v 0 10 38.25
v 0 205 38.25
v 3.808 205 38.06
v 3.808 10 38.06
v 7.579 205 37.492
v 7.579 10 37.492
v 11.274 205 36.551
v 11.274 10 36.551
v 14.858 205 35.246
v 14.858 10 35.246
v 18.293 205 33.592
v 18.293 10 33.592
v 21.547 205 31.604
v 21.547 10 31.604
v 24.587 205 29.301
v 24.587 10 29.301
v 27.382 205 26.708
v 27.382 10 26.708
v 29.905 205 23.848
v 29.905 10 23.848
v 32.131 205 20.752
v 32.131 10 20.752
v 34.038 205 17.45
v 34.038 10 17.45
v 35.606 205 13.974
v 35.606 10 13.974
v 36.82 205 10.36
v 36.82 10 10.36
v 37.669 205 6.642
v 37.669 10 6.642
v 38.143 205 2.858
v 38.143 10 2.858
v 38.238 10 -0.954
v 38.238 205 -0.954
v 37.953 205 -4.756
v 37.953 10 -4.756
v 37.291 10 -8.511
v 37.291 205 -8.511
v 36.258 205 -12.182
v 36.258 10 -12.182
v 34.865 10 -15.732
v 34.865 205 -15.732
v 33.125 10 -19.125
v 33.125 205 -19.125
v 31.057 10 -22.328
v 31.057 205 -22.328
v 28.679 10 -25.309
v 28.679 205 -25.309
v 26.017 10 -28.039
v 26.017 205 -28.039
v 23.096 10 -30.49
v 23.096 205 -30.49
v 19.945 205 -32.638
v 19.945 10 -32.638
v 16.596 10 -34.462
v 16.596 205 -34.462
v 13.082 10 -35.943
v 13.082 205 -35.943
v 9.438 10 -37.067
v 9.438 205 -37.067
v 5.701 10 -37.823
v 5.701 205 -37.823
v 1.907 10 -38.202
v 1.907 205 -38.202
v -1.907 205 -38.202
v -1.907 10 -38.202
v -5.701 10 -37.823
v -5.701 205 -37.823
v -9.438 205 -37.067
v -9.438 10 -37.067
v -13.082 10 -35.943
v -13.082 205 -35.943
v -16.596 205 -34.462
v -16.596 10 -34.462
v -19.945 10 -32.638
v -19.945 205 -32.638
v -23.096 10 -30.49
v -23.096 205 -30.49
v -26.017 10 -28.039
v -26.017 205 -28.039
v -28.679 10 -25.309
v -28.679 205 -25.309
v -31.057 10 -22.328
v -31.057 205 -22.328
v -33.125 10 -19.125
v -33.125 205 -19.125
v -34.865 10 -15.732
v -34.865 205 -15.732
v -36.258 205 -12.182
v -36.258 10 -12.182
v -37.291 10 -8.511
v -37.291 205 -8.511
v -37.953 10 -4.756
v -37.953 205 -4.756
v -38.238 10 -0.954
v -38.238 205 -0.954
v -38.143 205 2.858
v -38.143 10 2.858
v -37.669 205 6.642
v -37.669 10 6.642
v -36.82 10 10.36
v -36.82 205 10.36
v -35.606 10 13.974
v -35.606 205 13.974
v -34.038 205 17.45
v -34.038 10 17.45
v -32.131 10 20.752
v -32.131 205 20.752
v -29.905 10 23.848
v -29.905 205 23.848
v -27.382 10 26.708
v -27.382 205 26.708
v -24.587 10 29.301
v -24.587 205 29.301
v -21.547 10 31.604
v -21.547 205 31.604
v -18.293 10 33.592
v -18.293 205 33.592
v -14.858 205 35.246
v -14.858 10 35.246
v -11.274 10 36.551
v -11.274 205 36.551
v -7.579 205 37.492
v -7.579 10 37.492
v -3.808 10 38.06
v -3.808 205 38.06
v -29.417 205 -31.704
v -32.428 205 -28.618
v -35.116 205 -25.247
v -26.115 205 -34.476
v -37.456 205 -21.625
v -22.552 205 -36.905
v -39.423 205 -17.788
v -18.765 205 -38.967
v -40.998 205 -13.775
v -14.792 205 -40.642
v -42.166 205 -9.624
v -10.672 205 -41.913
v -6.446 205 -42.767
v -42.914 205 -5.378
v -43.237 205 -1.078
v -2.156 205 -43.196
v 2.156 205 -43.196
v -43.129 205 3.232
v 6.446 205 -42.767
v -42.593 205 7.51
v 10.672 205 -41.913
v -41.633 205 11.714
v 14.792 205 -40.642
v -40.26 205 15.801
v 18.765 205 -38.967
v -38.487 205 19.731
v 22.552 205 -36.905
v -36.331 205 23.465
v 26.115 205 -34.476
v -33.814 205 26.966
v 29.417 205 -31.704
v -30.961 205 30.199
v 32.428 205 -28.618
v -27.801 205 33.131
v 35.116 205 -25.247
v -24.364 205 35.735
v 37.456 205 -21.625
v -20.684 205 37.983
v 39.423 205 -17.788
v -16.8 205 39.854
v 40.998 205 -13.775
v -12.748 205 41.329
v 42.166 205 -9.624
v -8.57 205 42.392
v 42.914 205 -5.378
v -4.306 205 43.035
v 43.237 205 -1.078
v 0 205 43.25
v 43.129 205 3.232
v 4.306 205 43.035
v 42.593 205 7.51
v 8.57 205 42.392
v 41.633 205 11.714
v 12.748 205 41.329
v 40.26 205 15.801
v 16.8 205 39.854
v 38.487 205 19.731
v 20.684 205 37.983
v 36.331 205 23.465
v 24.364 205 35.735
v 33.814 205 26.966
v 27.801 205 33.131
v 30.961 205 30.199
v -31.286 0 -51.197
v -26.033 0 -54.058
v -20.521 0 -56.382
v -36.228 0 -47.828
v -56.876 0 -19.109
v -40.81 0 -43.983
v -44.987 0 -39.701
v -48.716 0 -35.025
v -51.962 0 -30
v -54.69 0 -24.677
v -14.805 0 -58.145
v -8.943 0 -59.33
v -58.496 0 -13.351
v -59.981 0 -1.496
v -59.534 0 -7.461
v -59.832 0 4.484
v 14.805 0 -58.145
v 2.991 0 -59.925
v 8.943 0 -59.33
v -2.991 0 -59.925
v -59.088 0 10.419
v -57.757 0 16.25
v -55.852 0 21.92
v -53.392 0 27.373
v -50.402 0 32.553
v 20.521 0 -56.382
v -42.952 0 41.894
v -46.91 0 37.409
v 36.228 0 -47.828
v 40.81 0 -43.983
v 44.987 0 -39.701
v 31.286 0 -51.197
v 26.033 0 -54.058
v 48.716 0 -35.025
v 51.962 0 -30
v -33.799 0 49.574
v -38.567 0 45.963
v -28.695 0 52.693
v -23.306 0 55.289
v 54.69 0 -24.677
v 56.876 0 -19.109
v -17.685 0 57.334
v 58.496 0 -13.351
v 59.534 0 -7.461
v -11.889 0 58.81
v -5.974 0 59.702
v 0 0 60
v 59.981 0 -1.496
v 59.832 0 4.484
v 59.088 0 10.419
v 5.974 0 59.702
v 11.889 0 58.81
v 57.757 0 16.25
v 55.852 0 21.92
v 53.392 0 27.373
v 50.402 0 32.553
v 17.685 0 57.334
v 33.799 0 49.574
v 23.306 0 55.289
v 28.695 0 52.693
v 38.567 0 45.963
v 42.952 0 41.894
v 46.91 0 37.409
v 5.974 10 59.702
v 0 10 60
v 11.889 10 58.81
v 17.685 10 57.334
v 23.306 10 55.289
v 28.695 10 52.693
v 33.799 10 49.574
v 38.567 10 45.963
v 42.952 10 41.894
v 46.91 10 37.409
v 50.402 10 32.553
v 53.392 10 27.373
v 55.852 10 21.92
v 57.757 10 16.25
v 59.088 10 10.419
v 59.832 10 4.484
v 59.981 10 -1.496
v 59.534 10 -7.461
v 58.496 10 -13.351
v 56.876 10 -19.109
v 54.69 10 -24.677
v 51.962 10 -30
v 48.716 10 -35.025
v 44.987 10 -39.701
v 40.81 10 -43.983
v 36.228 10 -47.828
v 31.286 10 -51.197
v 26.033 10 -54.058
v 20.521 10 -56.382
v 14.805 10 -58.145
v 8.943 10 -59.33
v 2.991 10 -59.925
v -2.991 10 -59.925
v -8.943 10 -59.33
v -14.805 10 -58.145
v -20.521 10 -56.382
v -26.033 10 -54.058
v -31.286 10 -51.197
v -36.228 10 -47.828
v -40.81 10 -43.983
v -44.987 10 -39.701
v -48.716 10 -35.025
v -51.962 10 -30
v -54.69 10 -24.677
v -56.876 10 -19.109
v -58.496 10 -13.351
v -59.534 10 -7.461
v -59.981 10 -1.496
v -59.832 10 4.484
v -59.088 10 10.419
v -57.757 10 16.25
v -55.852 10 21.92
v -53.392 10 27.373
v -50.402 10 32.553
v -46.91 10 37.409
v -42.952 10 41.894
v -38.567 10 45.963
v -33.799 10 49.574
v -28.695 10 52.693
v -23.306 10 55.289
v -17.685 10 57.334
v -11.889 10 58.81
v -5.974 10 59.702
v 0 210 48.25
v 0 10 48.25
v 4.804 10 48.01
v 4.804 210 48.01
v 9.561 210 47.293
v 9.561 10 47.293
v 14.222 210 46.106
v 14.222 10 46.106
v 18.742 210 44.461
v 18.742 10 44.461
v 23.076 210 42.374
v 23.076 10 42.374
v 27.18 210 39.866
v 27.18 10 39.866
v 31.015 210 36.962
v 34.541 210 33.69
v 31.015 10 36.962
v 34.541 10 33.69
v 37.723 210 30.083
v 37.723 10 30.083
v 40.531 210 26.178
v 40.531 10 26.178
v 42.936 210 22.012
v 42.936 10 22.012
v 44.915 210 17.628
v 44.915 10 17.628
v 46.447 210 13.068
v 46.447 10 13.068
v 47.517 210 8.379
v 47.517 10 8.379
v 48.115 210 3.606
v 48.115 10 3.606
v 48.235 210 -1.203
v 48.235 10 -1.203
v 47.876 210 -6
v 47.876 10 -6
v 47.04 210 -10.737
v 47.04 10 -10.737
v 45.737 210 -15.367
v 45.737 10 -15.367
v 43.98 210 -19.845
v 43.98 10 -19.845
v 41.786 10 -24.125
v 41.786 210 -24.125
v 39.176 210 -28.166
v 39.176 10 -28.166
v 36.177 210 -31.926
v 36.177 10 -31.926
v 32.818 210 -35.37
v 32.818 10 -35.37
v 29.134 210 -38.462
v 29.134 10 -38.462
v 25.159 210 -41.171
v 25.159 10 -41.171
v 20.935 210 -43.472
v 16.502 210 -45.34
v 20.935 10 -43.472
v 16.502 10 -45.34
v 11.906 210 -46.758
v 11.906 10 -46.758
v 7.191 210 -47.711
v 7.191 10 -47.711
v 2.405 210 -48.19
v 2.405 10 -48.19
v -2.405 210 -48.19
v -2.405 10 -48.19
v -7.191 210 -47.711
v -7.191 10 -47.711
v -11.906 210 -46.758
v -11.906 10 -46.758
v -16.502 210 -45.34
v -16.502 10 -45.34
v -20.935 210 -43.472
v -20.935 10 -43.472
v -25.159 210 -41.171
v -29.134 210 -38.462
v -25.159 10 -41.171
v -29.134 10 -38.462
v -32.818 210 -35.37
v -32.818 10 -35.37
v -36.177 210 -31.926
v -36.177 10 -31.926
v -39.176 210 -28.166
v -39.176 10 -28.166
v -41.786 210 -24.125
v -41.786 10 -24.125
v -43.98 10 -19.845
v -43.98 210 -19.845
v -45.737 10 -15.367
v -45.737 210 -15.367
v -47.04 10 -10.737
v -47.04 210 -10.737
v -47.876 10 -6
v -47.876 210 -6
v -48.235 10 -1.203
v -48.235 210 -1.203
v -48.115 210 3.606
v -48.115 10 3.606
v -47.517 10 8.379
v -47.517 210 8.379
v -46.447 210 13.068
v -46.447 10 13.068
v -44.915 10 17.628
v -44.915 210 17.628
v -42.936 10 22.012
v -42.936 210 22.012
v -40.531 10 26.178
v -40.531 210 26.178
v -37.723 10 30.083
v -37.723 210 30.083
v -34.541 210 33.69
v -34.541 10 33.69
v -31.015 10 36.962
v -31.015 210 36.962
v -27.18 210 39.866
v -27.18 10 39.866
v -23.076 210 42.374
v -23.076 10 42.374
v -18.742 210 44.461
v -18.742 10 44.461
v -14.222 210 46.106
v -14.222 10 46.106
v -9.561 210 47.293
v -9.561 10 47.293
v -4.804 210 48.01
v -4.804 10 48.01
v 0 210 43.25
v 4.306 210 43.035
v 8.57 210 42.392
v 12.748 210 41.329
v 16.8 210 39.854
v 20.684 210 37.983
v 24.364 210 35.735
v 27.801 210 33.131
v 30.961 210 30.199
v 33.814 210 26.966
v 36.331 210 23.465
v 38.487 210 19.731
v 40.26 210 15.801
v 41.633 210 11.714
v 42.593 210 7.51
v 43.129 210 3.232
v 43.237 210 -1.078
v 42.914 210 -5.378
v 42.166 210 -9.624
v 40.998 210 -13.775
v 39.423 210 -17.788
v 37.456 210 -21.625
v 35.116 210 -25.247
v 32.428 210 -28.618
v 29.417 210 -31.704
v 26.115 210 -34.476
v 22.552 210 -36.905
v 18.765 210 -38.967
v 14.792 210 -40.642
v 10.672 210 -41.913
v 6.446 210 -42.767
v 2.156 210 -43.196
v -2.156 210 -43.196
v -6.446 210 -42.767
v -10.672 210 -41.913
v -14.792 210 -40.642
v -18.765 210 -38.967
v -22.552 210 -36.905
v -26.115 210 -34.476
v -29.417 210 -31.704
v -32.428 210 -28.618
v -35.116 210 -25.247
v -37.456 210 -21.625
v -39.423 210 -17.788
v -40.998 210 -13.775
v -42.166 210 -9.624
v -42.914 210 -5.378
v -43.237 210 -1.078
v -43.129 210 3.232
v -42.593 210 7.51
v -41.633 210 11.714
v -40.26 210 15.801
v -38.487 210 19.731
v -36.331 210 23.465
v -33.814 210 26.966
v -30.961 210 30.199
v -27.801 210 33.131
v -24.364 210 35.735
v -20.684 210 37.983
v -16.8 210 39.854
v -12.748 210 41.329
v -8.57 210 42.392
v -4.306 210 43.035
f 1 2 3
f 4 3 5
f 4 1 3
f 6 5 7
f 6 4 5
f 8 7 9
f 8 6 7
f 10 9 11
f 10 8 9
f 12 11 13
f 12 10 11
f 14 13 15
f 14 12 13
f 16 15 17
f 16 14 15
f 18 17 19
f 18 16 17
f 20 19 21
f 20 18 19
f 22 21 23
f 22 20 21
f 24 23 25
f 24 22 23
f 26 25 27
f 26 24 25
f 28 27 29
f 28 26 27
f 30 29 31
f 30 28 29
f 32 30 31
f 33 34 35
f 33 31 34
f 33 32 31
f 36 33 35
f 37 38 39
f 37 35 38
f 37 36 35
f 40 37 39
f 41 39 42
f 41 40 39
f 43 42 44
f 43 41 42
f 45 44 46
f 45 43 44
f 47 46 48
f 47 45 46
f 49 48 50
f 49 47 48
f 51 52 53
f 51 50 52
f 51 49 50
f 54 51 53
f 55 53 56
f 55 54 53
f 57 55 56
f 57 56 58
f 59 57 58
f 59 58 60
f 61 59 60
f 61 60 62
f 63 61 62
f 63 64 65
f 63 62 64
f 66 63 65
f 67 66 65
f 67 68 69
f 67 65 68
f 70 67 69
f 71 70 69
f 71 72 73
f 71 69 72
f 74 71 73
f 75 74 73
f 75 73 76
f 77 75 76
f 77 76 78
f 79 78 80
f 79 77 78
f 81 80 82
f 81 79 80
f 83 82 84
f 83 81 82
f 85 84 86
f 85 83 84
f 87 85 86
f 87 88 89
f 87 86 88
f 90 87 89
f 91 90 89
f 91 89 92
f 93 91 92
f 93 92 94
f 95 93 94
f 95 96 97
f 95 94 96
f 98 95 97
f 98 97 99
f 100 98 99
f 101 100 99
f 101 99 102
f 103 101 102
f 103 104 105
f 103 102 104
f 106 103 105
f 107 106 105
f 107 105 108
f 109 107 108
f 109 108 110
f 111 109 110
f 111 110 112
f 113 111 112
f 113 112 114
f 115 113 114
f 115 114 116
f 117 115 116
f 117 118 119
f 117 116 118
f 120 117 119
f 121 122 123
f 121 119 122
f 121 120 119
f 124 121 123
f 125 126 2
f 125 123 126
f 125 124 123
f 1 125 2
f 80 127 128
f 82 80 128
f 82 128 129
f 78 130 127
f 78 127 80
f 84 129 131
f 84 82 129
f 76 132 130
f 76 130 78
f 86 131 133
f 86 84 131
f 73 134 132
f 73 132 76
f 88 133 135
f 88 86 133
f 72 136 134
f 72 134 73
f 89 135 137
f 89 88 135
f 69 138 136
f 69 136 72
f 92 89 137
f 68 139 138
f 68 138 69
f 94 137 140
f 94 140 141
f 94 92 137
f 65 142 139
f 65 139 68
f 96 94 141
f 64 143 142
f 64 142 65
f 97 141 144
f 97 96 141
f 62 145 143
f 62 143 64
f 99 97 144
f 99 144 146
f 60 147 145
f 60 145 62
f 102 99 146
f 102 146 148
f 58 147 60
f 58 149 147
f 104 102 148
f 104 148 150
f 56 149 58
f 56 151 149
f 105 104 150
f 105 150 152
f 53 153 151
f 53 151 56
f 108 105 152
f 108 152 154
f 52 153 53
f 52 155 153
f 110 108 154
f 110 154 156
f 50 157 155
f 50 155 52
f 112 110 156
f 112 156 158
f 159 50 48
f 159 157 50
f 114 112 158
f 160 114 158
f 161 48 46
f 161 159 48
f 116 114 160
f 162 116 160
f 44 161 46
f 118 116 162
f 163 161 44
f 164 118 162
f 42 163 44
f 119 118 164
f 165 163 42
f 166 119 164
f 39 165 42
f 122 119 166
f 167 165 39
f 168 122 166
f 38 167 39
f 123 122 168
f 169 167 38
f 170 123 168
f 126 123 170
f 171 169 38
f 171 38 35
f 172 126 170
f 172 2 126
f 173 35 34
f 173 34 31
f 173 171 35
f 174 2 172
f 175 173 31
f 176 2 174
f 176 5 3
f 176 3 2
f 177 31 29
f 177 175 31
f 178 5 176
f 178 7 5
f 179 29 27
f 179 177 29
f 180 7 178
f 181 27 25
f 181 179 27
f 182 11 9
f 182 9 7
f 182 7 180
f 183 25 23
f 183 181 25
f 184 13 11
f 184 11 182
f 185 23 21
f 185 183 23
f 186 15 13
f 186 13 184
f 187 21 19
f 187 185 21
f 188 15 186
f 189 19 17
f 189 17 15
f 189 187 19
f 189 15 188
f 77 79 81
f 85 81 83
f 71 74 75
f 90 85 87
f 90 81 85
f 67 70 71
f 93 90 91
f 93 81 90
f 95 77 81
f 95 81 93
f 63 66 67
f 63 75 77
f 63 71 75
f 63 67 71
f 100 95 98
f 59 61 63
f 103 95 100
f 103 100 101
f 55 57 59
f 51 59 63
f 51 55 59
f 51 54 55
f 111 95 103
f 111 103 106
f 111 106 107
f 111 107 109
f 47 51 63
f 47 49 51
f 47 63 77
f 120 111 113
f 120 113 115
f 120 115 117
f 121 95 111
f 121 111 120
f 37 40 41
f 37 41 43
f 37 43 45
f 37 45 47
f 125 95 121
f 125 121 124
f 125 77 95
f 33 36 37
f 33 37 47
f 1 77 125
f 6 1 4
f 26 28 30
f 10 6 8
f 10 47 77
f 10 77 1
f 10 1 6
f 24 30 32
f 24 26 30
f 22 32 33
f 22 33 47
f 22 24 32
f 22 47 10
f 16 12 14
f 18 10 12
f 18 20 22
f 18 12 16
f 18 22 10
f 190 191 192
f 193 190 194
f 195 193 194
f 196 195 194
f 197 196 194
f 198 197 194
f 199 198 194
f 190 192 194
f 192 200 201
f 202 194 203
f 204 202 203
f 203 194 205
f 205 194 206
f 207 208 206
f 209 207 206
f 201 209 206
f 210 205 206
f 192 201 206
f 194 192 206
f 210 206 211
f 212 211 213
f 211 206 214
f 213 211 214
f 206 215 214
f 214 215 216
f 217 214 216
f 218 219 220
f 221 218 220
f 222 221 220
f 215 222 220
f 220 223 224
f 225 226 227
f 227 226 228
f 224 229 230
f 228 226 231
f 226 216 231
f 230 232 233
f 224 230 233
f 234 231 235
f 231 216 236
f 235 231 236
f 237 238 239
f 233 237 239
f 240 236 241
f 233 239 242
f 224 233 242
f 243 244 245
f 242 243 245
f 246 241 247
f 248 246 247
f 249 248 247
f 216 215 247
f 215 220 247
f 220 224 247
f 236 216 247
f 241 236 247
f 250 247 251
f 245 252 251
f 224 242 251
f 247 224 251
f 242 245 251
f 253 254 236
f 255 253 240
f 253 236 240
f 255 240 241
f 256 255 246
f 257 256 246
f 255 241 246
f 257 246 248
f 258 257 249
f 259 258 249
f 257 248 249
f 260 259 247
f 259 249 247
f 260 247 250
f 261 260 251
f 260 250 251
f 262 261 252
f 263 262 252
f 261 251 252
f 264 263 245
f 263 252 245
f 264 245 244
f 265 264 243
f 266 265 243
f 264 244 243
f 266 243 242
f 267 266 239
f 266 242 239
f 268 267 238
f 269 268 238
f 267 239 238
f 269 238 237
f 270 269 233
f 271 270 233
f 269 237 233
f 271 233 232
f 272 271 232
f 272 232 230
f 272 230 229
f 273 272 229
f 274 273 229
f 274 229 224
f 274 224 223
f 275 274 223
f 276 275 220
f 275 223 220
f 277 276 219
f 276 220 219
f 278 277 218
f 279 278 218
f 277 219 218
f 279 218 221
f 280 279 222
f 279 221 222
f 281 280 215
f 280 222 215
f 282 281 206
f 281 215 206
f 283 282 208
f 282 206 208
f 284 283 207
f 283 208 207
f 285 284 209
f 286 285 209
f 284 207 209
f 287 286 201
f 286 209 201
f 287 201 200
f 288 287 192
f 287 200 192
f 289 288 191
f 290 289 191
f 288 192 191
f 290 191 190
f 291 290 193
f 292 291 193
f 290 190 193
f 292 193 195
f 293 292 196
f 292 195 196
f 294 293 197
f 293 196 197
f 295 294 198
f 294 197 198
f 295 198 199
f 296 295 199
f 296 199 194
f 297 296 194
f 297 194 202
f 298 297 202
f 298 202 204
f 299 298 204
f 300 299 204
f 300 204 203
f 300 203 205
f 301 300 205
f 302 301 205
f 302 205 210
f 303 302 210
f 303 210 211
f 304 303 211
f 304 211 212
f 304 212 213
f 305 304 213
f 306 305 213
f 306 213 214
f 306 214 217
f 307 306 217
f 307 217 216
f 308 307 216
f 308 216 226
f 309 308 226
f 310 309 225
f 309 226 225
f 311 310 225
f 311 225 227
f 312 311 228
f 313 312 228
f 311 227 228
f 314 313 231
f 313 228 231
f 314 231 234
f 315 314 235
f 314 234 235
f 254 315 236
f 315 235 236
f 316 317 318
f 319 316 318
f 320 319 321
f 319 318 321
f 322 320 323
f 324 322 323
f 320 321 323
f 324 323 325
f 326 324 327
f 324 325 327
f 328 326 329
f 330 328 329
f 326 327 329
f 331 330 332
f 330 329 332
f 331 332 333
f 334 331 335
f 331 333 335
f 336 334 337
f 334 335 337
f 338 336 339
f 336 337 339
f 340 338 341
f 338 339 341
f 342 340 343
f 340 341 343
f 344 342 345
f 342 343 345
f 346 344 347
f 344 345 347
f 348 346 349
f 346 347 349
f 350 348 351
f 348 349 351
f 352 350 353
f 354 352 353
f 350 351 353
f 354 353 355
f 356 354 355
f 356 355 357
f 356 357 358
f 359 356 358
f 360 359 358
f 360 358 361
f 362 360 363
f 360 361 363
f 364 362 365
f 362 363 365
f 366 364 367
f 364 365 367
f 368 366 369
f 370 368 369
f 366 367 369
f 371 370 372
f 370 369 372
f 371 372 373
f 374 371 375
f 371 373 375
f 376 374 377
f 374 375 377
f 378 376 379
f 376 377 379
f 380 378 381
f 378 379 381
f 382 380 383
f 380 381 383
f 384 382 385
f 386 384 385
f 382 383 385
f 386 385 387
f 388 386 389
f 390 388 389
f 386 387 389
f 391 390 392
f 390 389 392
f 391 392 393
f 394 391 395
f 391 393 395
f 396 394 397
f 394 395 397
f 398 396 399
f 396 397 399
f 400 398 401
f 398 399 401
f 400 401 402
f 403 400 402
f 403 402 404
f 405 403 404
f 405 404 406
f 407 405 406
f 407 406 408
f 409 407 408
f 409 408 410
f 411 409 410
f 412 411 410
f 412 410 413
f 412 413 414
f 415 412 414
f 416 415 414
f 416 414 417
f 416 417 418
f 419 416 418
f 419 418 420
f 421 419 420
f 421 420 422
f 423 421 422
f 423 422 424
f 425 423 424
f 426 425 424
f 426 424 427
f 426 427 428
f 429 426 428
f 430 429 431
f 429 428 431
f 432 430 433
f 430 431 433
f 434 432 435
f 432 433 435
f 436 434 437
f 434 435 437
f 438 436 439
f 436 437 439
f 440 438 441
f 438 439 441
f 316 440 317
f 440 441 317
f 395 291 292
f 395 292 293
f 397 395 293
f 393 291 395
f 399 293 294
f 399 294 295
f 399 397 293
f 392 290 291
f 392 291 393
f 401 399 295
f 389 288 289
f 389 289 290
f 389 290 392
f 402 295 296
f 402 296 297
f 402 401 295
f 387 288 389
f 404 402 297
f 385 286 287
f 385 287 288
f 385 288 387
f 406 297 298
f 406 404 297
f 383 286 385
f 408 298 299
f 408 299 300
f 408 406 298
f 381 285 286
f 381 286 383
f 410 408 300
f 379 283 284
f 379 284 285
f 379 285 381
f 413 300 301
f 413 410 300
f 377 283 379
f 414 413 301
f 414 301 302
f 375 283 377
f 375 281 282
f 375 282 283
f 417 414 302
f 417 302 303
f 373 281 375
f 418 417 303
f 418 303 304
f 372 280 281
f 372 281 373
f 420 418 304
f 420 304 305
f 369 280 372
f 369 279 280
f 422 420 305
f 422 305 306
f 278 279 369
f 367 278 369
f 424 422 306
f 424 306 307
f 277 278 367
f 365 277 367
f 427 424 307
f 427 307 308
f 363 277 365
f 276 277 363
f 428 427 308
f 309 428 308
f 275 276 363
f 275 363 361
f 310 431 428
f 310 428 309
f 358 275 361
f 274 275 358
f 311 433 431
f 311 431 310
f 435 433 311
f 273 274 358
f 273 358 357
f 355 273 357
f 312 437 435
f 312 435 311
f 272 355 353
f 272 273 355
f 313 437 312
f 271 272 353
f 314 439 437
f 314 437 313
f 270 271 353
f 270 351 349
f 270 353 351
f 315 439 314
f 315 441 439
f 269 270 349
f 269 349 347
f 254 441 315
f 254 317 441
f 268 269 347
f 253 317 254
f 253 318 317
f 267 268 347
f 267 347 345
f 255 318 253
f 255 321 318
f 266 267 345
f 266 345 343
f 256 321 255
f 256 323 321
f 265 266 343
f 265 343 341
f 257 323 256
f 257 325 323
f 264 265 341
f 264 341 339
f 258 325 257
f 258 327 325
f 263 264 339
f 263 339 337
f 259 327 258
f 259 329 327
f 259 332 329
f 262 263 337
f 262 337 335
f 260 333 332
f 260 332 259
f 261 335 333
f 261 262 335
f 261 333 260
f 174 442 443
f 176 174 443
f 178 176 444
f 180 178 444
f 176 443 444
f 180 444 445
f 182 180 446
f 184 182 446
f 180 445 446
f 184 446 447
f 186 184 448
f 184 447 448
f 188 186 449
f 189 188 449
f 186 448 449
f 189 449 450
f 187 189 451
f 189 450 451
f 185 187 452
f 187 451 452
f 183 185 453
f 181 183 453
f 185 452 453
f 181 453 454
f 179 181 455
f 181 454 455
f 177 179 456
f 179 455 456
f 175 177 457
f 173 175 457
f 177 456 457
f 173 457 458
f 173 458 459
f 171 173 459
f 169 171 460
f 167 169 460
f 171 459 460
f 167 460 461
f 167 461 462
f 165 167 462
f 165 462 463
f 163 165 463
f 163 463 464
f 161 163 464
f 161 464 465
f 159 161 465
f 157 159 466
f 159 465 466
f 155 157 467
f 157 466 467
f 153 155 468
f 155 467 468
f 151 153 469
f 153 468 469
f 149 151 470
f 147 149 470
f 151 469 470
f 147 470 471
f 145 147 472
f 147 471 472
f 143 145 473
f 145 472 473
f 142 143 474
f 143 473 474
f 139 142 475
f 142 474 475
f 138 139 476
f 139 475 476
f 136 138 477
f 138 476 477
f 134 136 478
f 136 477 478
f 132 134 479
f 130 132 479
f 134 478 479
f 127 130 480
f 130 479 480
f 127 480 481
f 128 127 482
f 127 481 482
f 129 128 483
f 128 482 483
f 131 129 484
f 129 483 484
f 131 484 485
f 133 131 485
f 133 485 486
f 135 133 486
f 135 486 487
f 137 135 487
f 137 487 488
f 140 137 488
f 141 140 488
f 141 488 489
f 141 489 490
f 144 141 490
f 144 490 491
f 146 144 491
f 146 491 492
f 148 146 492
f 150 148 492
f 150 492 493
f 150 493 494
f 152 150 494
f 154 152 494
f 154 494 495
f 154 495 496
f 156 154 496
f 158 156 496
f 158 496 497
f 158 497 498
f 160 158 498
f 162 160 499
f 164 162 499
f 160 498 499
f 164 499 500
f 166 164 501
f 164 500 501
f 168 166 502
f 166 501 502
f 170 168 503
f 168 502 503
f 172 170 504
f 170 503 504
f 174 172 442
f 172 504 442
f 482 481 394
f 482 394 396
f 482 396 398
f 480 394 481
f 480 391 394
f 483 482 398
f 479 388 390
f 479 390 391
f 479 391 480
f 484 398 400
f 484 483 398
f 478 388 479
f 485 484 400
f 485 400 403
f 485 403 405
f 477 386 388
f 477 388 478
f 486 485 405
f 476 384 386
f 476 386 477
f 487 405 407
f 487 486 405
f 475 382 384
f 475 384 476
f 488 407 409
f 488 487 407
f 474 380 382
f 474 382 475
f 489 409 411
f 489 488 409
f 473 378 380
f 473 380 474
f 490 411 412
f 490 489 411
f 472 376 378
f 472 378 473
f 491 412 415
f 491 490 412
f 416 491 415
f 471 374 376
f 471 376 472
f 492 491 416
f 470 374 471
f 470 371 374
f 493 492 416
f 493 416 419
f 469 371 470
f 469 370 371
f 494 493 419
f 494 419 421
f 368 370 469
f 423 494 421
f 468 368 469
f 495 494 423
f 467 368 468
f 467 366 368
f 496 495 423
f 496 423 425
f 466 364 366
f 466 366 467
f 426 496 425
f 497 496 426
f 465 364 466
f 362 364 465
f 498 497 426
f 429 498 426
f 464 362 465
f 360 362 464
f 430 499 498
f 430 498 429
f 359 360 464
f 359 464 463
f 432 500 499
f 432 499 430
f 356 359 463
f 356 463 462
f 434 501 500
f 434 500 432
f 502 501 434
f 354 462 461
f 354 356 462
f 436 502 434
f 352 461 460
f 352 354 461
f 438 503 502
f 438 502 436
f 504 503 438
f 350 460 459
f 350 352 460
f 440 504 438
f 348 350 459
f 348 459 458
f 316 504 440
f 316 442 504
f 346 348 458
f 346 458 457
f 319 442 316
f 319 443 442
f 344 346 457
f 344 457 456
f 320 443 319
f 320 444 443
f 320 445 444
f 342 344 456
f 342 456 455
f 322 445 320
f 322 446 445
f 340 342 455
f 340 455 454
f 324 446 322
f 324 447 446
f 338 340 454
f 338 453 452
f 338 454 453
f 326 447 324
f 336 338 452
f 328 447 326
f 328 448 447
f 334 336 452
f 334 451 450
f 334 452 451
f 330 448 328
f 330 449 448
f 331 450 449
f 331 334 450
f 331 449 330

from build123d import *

# Parameters (mm, degrees)
SKETCH1_R           = 60
BOSS_EXTRUDE1_DEPTH = 10
SKETCH2_R           = 48.25
SKETCH2_R_2         = 38.25
BOSS_EXTRUDE2_DEPTH = 200
SKETCH3_R           = 43.25
CUT_EXTRUDE1_DEPTH  = 5


with BuildPart() as part:
    # Sketch1 → Boss-Extrude1 (new body)
    with BuildSketch(Plane(origin=(0, 0, 0), x_dir=(1, 0, 0), z_dir=(0, 1, 0))):
        with Locations(Location((0, 0, 0), (0, 0, 270))):
            Circle(SKETCH1_R)
    extrude(amount=BOSS_EXTRUDE1_DEPTH)

    # Sketch2 → Boss-Extrude2 (add)
    with BuildSketch(Plane(origin=(0, 10, 0), x_dir=(1, 0, 0), z_dir=(0, 1, 0))):
        with Locations(Location((0, 0, 0), (0, 0, 270))):
            Circle(SKETCH2_R)
        with Locations(Location((0, 0, 0), (0, 0, 270))):
            Circle(SKETCH2_R_2, mode=Mode.SUBTRACT)
    extrude(amount=BOSS_EXTRUDE2_DEPTH)

    # Sketch3 → Cut-Extrude1 (cut)
    with BuildSketch(Plane(origin=(0, 210, 0), x_dir=(1, 0, 0), z_dir=(0, 1, 0))):
        with Locations(Location((0, 0, 0), (0, 0, 270))):
            Circle(SKETCH3_R)
    extrude(amount=-CUT_EXTRUDE1_DEPTH, mode=Mode.SUBTRACT)


solid = part.part
